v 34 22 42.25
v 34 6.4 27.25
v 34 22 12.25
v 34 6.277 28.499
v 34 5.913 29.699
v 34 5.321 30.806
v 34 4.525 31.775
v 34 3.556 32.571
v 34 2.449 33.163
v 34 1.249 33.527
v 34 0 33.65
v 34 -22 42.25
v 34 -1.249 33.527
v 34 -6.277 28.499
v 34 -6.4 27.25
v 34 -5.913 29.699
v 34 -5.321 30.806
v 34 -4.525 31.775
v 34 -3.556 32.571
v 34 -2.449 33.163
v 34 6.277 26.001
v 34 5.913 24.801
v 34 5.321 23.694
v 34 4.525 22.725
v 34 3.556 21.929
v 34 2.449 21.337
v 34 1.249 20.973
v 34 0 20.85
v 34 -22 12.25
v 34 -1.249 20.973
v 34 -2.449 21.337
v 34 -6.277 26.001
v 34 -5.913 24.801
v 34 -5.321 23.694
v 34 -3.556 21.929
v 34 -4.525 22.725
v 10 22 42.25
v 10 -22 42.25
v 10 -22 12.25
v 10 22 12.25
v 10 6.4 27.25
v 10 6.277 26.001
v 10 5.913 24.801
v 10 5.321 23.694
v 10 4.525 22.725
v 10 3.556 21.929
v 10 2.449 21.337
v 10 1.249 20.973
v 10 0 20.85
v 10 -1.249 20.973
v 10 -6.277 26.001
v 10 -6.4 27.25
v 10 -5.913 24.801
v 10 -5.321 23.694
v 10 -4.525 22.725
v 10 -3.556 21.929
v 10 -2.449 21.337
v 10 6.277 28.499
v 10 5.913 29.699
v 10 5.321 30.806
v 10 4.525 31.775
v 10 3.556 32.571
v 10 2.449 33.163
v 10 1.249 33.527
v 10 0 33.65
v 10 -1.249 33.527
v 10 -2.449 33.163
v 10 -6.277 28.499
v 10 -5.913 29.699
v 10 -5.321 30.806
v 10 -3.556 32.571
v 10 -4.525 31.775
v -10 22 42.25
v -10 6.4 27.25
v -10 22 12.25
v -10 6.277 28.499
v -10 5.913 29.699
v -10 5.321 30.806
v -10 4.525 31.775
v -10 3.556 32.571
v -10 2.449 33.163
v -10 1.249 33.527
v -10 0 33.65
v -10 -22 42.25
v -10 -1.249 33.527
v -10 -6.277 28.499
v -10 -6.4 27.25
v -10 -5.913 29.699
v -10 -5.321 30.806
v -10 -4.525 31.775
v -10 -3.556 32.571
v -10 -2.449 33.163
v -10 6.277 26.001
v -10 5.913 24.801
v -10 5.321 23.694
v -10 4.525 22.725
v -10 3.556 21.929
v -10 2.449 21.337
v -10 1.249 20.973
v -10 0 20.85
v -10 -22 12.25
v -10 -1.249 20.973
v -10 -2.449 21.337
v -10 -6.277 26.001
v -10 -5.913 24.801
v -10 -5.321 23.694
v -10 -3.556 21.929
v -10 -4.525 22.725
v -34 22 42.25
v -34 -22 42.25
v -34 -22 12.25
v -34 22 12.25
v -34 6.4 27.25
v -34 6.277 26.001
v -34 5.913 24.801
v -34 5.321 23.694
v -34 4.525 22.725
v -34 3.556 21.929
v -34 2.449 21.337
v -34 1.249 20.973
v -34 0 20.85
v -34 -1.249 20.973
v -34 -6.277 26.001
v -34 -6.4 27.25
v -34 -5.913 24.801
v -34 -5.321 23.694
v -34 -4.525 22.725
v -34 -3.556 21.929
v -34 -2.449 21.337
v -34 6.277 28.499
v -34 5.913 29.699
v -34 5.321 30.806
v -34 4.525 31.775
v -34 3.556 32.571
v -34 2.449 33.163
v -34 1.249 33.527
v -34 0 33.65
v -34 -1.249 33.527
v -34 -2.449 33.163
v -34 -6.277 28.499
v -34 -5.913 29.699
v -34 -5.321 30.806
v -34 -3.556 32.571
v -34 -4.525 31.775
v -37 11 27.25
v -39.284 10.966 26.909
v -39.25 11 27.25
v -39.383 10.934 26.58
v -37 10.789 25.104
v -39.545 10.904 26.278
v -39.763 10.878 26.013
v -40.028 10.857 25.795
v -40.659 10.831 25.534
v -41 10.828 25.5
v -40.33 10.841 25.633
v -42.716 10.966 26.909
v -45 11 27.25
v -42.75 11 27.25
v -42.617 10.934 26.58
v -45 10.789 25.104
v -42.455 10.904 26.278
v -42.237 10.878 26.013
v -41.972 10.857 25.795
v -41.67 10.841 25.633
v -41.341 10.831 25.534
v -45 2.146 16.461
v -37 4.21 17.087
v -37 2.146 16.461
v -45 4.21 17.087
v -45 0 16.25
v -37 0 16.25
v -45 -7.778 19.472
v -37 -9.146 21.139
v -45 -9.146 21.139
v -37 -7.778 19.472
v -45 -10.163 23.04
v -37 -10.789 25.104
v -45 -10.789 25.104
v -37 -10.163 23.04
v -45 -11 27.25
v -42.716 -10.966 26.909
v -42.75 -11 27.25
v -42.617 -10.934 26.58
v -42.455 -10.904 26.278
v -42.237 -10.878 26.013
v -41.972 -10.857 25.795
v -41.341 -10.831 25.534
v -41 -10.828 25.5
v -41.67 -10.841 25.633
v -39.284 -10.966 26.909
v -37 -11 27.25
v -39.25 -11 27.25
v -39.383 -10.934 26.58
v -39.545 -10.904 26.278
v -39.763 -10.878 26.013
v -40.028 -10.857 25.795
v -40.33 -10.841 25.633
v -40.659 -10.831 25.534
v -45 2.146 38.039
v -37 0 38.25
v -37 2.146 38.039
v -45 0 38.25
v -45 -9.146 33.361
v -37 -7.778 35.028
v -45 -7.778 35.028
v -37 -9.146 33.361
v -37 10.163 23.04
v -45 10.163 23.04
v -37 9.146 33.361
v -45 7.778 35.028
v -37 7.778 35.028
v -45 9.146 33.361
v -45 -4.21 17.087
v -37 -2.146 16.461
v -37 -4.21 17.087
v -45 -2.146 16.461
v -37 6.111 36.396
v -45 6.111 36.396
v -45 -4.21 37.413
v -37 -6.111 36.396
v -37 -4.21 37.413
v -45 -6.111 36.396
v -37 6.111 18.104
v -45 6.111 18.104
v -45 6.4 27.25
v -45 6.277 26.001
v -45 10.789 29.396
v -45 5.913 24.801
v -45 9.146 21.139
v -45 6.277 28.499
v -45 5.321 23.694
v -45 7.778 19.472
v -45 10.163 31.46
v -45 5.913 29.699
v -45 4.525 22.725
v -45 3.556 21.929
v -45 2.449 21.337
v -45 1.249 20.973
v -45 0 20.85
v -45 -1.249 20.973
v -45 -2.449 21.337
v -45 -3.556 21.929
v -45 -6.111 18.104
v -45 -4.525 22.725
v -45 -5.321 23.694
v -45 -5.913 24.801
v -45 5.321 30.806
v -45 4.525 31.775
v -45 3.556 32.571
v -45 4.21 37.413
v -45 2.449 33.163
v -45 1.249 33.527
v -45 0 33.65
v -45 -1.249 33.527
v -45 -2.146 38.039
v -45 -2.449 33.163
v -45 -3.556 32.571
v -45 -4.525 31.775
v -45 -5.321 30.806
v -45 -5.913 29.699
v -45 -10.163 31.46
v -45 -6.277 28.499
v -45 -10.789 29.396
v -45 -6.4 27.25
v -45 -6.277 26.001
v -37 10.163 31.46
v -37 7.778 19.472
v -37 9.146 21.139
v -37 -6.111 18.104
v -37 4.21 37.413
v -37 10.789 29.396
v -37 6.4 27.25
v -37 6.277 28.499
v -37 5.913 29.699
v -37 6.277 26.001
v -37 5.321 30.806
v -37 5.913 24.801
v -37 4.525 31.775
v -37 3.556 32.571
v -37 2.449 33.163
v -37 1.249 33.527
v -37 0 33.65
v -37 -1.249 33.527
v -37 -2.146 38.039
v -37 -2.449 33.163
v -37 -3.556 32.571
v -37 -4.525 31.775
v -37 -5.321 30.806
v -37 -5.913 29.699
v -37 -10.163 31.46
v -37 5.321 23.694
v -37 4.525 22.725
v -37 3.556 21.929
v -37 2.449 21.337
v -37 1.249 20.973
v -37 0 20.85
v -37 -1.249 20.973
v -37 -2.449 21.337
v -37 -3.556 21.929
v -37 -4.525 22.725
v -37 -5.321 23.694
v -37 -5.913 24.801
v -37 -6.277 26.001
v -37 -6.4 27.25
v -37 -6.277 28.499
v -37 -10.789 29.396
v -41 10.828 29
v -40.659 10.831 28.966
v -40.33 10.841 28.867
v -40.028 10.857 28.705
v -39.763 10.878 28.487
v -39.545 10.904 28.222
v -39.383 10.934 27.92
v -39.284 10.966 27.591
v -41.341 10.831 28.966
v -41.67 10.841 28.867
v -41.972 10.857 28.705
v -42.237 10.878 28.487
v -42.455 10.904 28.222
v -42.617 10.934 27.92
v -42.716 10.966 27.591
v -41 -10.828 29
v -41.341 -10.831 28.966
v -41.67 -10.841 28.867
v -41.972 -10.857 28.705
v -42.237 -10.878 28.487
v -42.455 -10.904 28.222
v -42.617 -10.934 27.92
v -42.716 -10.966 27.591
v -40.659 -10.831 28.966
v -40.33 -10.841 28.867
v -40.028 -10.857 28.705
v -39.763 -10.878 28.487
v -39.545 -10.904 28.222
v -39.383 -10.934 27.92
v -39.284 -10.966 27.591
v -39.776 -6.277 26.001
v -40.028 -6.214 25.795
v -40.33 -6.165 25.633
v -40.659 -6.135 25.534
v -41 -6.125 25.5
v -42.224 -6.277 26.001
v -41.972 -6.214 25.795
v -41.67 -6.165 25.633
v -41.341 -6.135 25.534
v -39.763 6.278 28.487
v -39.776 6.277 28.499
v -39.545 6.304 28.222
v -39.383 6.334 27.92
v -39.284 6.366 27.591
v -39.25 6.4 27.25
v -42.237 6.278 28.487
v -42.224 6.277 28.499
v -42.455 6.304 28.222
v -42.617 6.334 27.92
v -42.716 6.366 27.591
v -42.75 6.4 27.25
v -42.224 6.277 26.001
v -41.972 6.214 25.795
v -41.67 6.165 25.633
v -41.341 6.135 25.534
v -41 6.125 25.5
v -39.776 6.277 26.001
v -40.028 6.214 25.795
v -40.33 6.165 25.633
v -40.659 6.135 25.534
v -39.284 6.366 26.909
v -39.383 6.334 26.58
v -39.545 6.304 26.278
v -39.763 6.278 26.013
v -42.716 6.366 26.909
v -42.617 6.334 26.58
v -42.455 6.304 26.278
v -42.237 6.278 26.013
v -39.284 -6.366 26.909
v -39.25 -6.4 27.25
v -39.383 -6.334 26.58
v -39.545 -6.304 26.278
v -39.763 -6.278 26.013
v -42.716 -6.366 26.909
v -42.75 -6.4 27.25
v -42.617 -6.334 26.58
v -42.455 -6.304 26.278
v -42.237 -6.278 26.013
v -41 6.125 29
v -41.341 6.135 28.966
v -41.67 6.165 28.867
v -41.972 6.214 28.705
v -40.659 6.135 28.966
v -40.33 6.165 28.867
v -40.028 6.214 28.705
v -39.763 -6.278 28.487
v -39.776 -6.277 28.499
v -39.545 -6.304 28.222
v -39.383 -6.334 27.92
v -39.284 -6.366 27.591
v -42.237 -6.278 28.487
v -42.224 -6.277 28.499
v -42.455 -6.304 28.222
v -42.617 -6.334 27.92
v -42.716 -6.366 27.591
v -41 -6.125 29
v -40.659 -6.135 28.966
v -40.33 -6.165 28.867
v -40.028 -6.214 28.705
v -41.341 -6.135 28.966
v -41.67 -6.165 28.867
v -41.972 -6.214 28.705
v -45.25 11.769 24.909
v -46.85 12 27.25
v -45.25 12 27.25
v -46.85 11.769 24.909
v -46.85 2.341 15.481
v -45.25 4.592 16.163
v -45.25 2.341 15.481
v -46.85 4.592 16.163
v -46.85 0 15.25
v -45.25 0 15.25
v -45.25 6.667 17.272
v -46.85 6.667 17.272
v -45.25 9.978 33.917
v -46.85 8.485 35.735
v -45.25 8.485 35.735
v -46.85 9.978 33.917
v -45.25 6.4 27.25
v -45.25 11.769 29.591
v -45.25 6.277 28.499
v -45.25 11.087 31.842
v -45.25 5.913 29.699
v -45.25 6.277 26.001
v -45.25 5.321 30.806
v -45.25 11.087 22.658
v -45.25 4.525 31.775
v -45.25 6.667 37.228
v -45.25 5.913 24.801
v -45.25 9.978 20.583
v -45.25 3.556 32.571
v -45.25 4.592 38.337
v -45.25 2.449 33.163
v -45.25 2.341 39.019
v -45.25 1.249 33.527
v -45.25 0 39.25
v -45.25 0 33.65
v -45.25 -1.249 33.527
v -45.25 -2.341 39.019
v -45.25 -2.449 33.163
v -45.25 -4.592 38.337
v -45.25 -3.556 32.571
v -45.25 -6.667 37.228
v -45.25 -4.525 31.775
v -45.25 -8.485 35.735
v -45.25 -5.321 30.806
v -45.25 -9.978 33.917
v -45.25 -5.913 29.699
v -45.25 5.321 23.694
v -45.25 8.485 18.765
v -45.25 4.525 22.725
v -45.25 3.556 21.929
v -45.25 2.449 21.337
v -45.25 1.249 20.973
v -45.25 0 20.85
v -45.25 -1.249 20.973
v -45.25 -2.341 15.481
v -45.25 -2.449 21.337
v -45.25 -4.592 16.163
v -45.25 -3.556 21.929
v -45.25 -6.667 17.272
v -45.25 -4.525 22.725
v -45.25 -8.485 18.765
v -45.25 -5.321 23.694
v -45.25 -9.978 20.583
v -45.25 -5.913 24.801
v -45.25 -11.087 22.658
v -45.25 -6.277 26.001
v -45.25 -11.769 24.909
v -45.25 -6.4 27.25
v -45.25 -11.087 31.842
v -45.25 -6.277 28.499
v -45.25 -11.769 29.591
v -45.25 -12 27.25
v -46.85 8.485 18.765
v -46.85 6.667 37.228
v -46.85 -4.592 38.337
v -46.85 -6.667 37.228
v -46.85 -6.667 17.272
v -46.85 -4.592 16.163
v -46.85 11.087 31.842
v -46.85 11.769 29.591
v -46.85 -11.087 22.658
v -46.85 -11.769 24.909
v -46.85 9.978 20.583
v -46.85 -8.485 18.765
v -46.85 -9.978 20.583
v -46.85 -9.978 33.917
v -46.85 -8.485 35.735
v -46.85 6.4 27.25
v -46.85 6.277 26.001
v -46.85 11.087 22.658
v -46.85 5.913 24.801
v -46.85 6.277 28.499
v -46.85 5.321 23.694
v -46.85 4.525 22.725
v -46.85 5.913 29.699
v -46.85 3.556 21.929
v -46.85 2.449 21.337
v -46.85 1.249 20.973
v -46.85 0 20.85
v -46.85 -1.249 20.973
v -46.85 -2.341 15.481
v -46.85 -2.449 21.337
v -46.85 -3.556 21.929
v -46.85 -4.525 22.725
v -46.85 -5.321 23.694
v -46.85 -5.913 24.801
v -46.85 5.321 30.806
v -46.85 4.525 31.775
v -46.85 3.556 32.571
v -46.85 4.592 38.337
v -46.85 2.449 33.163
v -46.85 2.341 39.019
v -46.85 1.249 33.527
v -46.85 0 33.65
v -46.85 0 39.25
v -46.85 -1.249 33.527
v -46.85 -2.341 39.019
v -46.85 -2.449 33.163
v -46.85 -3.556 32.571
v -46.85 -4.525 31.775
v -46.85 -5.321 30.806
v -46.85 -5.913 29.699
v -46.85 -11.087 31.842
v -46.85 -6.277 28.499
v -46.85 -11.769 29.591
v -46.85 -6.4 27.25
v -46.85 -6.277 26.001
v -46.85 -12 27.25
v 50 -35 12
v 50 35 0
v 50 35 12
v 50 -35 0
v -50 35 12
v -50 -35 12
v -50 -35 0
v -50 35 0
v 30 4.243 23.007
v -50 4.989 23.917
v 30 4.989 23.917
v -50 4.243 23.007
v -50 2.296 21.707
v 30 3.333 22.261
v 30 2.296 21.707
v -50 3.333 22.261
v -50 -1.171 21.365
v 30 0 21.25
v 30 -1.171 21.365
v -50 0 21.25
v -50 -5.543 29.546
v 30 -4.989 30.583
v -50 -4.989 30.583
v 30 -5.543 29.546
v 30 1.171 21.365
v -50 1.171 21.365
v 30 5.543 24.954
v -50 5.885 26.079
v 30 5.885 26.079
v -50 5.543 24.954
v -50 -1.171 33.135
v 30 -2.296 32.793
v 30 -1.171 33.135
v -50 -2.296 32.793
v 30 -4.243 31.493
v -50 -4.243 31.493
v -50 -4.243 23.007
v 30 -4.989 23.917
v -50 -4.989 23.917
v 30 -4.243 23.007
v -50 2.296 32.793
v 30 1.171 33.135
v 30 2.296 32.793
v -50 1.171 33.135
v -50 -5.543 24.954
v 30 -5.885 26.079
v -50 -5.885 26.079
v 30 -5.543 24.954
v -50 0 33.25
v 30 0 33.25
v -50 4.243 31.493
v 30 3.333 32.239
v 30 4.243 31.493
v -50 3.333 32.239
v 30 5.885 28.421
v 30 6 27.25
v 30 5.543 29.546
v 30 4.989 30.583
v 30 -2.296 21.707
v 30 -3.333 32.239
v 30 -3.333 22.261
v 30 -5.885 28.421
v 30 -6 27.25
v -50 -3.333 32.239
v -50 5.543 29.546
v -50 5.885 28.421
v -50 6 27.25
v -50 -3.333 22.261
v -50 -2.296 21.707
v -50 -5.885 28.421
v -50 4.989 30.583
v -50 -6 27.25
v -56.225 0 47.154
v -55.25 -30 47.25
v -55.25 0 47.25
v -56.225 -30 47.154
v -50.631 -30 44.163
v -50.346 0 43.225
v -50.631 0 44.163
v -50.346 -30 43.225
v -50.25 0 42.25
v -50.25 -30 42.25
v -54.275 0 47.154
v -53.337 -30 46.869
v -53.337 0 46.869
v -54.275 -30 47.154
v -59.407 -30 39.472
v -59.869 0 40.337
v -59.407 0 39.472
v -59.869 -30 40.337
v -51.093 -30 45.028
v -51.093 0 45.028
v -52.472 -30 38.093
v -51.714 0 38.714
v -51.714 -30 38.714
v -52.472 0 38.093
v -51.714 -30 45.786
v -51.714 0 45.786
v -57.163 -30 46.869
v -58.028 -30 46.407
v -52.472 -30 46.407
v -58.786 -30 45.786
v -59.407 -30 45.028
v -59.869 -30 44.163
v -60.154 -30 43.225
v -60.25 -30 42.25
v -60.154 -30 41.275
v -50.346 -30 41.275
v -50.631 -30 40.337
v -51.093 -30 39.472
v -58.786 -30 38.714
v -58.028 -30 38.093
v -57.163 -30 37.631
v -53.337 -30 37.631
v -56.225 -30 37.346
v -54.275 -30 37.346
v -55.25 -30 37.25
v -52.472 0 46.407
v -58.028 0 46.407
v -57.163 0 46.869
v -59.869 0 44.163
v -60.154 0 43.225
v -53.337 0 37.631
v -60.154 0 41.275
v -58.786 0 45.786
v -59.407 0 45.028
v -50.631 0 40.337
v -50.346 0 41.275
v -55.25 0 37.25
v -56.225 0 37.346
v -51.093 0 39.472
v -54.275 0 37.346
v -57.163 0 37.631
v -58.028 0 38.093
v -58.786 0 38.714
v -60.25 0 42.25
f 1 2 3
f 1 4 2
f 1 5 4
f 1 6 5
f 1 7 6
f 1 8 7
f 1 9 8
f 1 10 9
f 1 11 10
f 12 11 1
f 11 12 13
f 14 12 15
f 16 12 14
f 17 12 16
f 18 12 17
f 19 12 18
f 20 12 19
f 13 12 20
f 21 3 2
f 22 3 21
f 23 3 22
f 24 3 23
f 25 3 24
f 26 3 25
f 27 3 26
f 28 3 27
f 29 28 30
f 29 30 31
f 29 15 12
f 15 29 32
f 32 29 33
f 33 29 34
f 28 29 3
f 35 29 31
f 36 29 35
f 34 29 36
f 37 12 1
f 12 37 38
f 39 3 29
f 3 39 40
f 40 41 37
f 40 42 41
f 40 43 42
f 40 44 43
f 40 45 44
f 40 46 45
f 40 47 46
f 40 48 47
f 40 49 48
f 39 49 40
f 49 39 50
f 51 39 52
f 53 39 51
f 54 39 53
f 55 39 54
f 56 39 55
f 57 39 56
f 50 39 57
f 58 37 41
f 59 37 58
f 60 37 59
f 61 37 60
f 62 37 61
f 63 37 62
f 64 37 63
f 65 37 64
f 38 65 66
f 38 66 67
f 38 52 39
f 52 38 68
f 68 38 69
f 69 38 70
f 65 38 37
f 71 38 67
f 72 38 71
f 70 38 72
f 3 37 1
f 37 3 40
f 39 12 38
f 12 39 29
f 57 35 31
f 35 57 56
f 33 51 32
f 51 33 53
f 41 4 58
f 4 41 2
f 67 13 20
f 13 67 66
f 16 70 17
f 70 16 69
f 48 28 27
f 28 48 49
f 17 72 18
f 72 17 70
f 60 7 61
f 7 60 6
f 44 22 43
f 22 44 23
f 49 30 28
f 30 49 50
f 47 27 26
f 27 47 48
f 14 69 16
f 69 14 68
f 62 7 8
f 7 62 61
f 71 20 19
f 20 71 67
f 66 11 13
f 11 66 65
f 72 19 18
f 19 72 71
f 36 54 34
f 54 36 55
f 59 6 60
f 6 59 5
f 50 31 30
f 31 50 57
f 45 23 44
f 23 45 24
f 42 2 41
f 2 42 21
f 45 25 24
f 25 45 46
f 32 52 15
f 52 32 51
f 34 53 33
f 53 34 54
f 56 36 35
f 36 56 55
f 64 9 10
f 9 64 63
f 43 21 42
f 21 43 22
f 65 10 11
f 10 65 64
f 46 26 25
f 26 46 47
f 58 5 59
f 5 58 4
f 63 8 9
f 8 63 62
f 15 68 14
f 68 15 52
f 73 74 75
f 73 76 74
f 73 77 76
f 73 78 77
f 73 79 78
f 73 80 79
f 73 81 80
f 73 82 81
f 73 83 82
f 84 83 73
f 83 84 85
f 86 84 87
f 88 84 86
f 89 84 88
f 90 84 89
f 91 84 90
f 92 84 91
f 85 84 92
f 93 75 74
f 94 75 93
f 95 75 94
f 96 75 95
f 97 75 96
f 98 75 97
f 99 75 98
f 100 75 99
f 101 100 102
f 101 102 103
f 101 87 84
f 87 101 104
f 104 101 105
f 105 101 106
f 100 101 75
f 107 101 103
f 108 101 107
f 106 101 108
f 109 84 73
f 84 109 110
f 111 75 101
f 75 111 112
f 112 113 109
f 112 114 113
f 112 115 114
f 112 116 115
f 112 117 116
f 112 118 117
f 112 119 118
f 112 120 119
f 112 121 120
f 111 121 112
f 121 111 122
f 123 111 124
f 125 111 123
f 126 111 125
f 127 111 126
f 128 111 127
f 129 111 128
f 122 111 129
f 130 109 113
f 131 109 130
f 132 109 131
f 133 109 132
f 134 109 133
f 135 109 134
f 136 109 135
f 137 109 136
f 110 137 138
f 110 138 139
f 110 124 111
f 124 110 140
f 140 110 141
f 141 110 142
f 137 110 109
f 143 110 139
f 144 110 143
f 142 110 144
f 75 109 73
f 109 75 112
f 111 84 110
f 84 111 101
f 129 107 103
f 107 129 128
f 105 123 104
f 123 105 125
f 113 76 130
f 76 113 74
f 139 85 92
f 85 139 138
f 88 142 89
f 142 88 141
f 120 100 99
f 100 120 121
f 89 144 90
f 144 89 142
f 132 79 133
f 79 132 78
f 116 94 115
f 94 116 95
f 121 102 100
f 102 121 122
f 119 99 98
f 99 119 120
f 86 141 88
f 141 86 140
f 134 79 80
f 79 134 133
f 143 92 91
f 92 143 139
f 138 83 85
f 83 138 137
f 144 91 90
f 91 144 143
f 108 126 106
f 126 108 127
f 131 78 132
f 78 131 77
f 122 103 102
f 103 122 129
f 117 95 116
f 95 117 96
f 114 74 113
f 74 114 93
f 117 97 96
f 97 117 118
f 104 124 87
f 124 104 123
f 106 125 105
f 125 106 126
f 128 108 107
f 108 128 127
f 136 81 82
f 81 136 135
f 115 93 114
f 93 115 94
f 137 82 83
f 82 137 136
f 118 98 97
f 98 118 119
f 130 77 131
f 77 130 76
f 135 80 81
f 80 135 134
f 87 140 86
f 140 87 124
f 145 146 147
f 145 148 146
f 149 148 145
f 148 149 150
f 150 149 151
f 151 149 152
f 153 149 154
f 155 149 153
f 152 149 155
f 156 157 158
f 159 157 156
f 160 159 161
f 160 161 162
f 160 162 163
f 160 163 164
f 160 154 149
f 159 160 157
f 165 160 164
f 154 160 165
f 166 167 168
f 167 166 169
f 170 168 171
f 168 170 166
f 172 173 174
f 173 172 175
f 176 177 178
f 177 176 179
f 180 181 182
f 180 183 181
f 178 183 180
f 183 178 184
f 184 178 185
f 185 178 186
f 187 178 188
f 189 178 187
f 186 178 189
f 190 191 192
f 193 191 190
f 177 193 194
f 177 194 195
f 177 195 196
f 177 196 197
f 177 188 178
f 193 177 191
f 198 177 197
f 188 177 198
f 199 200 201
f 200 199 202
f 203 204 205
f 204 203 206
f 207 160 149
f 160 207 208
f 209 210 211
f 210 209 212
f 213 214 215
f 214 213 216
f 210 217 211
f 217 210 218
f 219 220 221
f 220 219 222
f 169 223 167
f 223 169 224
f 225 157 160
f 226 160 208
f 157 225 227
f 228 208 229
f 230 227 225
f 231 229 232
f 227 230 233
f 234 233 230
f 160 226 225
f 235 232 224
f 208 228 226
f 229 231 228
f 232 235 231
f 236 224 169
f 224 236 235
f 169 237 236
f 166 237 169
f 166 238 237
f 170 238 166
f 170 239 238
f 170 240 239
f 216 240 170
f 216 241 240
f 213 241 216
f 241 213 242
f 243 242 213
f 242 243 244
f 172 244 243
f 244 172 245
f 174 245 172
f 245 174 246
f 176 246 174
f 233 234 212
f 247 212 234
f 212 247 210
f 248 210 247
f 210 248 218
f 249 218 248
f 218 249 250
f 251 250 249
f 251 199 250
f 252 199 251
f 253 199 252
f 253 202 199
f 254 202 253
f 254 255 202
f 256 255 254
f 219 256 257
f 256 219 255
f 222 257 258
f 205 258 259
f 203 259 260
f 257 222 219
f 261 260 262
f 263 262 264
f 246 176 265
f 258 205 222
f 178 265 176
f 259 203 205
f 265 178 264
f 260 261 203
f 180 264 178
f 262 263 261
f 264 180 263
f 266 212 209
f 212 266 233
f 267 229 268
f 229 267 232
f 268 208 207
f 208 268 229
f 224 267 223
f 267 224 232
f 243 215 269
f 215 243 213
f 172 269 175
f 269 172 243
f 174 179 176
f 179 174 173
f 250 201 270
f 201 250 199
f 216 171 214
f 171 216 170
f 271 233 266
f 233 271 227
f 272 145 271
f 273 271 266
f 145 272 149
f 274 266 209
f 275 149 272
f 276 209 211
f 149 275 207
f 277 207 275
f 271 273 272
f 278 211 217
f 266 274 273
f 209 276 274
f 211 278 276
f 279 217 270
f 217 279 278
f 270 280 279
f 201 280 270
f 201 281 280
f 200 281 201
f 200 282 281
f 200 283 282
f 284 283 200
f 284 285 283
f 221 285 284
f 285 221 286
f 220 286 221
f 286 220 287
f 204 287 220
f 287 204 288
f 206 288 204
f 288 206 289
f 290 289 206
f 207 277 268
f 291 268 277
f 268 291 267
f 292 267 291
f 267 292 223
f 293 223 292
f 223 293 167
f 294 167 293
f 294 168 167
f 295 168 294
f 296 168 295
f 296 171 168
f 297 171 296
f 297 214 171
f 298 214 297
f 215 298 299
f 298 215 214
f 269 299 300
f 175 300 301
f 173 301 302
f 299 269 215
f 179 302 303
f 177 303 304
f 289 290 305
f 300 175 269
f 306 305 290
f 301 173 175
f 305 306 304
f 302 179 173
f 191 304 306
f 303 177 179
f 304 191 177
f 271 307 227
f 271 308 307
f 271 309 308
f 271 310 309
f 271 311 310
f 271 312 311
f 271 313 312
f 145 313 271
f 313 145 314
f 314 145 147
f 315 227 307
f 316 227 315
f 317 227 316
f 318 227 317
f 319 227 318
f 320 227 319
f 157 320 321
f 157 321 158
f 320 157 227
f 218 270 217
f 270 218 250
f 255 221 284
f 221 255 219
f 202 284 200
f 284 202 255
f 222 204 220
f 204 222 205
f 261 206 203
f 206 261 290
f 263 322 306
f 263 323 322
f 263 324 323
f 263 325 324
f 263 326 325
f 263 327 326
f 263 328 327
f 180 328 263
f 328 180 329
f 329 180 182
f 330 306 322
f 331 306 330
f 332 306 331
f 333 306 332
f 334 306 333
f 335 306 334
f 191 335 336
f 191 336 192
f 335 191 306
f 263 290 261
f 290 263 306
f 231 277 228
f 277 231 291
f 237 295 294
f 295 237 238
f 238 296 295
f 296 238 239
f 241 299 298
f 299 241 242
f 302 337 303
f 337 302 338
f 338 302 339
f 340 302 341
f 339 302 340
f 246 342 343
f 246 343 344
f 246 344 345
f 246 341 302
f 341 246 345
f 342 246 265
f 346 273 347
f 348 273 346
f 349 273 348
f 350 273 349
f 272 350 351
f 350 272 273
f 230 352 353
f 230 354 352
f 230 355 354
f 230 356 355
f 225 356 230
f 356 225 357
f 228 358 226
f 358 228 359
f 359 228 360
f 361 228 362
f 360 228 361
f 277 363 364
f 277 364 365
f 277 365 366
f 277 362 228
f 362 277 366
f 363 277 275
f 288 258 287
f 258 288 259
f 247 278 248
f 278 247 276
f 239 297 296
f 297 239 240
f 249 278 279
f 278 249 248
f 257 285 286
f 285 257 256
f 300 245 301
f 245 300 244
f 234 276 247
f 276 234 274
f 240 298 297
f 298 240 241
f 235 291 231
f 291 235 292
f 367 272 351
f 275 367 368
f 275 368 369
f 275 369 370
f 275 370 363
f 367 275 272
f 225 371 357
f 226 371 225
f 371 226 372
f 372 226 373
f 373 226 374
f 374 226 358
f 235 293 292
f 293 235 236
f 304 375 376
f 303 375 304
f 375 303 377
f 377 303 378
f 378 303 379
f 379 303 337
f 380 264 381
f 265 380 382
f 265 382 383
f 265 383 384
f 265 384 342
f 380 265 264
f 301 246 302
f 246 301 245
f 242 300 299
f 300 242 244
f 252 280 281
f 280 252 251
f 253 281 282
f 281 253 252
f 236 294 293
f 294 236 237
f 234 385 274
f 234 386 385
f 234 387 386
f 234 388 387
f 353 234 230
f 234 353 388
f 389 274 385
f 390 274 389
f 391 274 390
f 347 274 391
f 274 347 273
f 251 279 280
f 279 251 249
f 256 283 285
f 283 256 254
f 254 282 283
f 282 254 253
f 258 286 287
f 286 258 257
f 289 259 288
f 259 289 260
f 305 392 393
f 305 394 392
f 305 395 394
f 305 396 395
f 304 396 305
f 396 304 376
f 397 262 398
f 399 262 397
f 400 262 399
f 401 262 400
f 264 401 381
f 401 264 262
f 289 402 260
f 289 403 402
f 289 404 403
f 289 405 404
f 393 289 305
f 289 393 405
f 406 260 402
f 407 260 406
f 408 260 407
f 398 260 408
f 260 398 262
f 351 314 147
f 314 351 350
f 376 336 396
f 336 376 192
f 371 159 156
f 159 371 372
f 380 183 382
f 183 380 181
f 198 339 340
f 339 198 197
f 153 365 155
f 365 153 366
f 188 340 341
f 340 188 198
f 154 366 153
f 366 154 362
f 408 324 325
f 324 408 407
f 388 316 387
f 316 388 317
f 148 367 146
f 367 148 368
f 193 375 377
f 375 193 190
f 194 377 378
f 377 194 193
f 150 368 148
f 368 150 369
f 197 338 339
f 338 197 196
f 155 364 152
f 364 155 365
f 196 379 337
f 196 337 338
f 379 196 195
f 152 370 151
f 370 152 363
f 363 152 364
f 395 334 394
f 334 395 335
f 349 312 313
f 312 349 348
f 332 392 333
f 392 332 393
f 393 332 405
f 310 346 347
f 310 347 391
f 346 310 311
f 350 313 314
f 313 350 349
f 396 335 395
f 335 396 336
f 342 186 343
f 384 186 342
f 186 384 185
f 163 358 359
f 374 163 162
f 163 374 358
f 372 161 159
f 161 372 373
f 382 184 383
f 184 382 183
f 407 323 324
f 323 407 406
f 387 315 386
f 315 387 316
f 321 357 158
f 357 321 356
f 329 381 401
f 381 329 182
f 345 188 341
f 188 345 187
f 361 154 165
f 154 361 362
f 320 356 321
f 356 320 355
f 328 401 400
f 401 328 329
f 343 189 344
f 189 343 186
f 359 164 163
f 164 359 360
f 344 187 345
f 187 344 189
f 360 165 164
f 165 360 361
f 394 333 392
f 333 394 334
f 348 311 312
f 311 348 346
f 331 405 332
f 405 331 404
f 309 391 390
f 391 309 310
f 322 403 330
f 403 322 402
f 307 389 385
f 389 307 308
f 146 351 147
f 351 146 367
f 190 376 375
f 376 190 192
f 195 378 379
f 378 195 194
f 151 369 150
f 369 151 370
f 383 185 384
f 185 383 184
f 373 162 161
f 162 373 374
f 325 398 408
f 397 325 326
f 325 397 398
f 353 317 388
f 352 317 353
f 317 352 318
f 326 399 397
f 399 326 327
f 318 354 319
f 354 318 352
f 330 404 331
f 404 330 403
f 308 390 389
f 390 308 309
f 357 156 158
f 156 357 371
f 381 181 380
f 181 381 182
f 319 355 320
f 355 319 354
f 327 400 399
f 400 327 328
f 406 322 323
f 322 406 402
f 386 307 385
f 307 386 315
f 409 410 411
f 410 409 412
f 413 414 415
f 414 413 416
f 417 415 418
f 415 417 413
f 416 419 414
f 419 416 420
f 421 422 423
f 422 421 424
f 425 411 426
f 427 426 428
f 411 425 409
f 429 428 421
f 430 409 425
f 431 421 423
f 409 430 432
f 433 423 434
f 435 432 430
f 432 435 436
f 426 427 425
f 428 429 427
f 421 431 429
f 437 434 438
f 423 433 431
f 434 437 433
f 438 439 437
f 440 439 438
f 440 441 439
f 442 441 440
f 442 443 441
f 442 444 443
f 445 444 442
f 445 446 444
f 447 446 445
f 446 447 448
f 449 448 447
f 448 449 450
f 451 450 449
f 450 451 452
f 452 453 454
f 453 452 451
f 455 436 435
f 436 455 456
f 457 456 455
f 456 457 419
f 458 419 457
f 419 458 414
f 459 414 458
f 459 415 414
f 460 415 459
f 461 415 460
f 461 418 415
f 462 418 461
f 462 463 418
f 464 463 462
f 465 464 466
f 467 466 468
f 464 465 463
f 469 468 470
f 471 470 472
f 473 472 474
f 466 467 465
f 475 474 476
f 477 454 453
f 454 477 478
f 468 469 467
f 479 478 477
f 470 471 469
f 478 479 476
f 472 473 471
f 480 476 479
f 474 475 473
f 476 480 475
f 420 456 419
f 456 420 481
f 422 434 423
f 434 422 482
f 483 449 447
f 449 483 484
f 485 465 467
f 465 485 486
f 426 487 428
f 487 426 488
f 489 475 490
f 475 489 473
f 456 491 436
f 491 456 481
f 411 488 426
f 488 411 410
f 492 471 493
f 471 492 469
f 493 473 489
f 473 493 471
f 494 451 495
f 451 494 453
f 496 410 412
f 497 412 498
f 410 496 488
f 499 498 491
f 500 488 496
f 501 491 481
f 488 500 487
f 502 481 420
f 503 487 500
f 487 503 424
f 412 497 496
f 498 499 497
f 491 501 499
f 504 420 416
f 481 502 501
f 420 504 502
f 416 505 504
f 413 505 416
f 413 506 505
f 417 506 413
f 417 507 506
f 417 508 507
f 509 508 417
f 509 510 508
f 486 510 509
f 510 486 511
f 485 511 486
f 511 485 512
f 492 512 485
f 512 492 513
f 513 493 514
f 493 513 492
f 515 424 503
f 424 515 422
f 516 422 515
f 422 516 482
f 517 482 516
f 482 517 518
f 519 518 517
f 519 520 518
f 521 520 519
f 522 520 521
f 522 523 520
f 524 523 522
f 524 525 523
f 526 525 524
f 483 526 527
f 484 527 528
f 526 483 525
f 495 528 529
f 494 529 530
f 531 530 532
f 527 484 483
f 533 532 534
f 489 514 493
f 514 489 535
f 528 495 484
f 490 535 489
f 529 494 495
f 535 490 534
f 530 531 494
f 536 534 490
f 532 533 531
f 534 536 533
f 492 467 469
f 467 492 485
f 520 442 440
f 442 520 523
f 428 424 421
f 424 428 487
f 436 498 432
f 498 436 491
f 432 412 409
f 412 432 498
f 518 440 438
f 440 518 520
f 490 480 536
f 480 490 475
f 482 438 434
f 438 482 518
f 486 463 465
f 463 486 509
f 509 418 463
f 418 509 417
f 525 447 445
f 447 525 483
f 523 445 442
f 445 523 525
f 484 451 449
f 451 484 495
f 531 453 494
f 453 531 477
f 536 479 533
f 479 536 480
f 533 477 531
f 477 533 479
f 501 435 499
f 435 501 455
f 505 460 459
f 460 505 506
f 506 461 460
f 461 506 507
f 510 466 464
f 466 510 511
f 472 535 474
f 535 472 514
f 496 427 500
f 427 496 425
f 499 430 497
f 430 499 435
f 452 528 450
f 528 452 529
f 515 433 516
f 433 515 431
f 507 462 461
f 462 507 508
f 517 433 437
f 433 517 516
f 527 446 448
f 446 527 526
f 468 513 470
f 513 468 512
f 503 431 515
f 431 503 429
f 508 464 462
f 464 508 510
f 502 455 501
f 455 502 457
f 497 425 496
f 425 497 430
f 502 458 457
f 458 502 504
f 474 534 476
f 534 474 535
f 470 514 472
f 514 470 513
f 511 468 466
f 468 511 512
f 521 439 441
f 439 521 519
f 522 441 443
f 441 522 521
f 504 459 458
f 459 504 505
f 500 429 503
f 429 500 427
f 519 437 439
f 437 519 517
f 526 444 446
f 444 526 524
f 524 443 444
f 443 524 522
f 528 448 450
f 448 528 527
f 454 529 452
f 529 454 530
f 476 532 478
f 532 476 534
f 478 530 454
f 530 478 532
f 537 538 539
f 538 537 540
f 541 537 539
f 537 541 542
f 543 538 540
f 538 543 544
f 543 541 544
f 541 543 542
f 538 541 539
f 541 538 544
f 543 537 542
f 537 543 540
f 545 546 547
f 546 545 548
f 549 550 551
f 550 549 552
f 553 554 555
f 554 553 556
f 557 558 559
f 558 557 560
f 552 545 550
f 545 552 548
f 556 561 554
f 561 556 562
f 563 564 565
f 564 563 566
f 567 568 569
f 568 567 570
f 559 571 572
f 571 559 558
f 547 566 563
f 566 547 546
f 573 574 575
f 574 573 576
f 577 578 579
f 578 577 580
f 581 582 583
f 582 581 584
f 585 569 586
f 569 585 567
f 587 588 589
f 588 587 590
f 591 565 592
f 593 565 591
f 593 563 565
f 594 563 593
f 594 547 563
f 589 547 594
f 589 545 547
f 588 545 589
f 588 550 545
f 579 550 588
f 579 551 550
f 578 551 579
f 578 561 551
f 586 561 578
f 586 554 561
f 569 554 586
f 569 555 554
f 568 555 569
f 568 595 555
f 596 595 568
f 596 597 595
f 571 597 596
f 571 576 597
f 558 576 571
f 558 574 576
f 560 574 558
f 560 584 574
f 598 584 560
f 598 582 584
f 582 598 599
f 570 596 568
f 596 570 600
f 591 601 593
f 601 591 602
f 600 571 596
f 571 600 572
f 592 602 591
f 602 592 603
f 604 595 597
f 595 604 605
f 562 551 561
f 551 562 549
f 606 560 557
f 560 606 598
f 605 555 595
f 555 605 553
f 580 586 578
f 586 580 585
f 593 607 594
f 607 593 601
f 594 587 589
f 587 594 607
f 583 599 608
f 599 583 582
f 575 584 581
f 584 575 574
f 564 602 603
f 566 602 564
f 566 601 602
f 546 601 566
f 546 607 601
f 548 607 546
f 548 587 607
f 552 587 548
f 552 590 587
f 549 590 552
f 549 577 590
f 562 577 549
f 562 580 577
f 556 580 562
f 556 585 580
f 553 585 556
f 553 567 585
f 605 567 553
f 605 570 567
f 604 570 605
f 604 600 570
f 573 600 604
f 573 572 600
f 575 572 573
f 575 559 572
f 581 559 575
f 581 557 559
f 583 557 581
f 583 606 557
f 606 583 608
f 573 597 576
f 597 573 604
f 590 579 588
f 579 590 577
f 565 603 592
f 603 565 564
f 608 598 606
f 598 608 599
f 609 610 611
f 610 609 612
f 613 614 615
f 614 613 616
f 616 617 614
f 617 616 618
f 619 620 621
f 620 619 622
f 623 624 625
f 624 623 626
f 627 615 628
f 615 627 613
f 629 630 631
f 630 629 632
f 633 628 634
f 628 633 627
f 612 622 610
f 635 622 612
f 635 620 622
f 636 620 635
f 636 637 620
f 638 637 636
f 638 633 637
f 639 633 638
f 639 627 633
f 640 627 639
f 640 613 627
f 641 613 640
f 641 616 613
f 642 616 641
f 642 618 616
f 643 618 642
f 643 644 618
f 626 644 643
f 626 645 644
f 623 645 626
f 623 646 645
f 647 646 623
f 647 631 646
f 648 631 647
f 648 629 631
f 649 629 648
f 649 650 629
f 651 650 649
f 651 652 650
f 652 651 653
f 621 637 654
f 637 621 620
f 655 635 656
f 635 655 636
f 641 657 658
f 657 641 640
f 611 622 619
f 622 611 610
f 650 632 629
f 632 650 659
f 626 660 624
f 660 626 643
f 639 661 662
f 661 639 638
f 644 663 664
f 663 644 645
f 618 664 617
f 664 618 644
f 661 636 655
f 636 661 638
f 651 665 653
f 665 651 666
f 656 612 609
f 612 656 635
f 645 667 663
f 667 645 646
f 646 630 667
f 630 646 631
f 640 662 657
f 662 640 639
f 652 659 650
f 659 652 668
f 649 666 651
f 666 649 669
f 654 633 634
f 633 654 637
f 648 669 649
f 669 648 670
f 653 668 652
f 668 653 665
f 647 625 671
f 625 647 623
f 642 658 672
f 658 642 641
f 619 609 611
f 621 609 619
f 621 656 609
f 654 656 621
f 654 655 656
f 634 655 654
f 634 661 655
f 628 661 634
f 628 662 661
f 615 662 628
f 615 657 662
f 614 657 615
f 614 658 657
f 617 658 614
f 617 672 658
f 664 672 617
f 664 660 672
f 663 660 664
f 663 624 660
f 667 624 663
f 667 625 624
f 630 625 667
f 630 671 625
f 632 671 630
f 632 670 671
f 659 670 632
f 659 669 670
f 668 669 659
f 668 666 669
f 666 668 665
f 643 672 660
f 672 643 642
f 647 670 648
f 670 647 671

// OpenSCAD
$fn = 32;

// ------------------------------------------------------------------------
// Machine vise: screw d12, jaws 24 x 30 mm
// Every part is its own module, assembly() places every instance.
// ------------------------------------------------------------------------

// --- part 1 ---
module vise_bed() {
  difference() {
    translate([-50, -35, 0]) cube([100, 70, 12]);
  }
}

// --- part 2 ---
module vise_jaw() {
  difference() {
    translate([-12, -22, 0]) cube([24, 44, 30]);
    translate([0, 0, 15]) rotate([0, 90, 0]) cylinder(h = 26, d = 12.8, center = true);
  }
}

// --- part 3 ---
module vise_screw() {
  translate([0, 0, -40]) cylinder(h = 80, d = 12);
}

// --- part 4 ---
module screw_collar() {
  difference() {
    cylinder(h = 8, d = 22);
    translate([0, 0, -1]) cylinder(h = 10, d = 12.8);
    translate([0, 0, 4]) rotate([90, 0, 0]) cylinder(h = 24, d = 3.5, center = true);
  }
}

// --- part 5 ---
module screw_washer() {
  difference() {
      translate([0, 0, 0]) cylinder(h = 1.6, d = 24);
      translate([0, 0, -1]) cylinder(h = 3.6, d = 12.8);
    }
}

// --- part 6 ---
module vise_handle() {
  cylinder(h = 30, d = 10);
}

// --- assembly ---
module assembly() {
  color([0.80, 0.24, 0.20]) translate([0, 0, 0]) rotate([0, 0, 0]) vise_bed();
  color([0.20, 0.45, 0.75]) translate([22, 0, 12.25]) rotate([0, 0, 0]) vise_jaw();
  color([0.25, 0.62, 0.32]) translate([-22, 0, 12.25]) rotate([0, 0, 0]) vise_jaw();
  color([0.92, 0.70, 0.18]) translate([-10, 0, 27.25]) rotate([0, 90, 0]) vise_screw();
  color([0.58, 0.35, 0.70]) translate([-45, 0, 27.25]) rotate([0, 90, 0]) screw_collar();
  color([0.16, 0.66, 0.66]) translate([-46.85, 0, 27.25]) rotate([0, 90, 0]) screw_washer();
  color([0.85, 0.48, 0.18]) translate([-55.25, 0, 42.25]) rotate([90, 0, 0]) vise_handle();
}

assembly();
